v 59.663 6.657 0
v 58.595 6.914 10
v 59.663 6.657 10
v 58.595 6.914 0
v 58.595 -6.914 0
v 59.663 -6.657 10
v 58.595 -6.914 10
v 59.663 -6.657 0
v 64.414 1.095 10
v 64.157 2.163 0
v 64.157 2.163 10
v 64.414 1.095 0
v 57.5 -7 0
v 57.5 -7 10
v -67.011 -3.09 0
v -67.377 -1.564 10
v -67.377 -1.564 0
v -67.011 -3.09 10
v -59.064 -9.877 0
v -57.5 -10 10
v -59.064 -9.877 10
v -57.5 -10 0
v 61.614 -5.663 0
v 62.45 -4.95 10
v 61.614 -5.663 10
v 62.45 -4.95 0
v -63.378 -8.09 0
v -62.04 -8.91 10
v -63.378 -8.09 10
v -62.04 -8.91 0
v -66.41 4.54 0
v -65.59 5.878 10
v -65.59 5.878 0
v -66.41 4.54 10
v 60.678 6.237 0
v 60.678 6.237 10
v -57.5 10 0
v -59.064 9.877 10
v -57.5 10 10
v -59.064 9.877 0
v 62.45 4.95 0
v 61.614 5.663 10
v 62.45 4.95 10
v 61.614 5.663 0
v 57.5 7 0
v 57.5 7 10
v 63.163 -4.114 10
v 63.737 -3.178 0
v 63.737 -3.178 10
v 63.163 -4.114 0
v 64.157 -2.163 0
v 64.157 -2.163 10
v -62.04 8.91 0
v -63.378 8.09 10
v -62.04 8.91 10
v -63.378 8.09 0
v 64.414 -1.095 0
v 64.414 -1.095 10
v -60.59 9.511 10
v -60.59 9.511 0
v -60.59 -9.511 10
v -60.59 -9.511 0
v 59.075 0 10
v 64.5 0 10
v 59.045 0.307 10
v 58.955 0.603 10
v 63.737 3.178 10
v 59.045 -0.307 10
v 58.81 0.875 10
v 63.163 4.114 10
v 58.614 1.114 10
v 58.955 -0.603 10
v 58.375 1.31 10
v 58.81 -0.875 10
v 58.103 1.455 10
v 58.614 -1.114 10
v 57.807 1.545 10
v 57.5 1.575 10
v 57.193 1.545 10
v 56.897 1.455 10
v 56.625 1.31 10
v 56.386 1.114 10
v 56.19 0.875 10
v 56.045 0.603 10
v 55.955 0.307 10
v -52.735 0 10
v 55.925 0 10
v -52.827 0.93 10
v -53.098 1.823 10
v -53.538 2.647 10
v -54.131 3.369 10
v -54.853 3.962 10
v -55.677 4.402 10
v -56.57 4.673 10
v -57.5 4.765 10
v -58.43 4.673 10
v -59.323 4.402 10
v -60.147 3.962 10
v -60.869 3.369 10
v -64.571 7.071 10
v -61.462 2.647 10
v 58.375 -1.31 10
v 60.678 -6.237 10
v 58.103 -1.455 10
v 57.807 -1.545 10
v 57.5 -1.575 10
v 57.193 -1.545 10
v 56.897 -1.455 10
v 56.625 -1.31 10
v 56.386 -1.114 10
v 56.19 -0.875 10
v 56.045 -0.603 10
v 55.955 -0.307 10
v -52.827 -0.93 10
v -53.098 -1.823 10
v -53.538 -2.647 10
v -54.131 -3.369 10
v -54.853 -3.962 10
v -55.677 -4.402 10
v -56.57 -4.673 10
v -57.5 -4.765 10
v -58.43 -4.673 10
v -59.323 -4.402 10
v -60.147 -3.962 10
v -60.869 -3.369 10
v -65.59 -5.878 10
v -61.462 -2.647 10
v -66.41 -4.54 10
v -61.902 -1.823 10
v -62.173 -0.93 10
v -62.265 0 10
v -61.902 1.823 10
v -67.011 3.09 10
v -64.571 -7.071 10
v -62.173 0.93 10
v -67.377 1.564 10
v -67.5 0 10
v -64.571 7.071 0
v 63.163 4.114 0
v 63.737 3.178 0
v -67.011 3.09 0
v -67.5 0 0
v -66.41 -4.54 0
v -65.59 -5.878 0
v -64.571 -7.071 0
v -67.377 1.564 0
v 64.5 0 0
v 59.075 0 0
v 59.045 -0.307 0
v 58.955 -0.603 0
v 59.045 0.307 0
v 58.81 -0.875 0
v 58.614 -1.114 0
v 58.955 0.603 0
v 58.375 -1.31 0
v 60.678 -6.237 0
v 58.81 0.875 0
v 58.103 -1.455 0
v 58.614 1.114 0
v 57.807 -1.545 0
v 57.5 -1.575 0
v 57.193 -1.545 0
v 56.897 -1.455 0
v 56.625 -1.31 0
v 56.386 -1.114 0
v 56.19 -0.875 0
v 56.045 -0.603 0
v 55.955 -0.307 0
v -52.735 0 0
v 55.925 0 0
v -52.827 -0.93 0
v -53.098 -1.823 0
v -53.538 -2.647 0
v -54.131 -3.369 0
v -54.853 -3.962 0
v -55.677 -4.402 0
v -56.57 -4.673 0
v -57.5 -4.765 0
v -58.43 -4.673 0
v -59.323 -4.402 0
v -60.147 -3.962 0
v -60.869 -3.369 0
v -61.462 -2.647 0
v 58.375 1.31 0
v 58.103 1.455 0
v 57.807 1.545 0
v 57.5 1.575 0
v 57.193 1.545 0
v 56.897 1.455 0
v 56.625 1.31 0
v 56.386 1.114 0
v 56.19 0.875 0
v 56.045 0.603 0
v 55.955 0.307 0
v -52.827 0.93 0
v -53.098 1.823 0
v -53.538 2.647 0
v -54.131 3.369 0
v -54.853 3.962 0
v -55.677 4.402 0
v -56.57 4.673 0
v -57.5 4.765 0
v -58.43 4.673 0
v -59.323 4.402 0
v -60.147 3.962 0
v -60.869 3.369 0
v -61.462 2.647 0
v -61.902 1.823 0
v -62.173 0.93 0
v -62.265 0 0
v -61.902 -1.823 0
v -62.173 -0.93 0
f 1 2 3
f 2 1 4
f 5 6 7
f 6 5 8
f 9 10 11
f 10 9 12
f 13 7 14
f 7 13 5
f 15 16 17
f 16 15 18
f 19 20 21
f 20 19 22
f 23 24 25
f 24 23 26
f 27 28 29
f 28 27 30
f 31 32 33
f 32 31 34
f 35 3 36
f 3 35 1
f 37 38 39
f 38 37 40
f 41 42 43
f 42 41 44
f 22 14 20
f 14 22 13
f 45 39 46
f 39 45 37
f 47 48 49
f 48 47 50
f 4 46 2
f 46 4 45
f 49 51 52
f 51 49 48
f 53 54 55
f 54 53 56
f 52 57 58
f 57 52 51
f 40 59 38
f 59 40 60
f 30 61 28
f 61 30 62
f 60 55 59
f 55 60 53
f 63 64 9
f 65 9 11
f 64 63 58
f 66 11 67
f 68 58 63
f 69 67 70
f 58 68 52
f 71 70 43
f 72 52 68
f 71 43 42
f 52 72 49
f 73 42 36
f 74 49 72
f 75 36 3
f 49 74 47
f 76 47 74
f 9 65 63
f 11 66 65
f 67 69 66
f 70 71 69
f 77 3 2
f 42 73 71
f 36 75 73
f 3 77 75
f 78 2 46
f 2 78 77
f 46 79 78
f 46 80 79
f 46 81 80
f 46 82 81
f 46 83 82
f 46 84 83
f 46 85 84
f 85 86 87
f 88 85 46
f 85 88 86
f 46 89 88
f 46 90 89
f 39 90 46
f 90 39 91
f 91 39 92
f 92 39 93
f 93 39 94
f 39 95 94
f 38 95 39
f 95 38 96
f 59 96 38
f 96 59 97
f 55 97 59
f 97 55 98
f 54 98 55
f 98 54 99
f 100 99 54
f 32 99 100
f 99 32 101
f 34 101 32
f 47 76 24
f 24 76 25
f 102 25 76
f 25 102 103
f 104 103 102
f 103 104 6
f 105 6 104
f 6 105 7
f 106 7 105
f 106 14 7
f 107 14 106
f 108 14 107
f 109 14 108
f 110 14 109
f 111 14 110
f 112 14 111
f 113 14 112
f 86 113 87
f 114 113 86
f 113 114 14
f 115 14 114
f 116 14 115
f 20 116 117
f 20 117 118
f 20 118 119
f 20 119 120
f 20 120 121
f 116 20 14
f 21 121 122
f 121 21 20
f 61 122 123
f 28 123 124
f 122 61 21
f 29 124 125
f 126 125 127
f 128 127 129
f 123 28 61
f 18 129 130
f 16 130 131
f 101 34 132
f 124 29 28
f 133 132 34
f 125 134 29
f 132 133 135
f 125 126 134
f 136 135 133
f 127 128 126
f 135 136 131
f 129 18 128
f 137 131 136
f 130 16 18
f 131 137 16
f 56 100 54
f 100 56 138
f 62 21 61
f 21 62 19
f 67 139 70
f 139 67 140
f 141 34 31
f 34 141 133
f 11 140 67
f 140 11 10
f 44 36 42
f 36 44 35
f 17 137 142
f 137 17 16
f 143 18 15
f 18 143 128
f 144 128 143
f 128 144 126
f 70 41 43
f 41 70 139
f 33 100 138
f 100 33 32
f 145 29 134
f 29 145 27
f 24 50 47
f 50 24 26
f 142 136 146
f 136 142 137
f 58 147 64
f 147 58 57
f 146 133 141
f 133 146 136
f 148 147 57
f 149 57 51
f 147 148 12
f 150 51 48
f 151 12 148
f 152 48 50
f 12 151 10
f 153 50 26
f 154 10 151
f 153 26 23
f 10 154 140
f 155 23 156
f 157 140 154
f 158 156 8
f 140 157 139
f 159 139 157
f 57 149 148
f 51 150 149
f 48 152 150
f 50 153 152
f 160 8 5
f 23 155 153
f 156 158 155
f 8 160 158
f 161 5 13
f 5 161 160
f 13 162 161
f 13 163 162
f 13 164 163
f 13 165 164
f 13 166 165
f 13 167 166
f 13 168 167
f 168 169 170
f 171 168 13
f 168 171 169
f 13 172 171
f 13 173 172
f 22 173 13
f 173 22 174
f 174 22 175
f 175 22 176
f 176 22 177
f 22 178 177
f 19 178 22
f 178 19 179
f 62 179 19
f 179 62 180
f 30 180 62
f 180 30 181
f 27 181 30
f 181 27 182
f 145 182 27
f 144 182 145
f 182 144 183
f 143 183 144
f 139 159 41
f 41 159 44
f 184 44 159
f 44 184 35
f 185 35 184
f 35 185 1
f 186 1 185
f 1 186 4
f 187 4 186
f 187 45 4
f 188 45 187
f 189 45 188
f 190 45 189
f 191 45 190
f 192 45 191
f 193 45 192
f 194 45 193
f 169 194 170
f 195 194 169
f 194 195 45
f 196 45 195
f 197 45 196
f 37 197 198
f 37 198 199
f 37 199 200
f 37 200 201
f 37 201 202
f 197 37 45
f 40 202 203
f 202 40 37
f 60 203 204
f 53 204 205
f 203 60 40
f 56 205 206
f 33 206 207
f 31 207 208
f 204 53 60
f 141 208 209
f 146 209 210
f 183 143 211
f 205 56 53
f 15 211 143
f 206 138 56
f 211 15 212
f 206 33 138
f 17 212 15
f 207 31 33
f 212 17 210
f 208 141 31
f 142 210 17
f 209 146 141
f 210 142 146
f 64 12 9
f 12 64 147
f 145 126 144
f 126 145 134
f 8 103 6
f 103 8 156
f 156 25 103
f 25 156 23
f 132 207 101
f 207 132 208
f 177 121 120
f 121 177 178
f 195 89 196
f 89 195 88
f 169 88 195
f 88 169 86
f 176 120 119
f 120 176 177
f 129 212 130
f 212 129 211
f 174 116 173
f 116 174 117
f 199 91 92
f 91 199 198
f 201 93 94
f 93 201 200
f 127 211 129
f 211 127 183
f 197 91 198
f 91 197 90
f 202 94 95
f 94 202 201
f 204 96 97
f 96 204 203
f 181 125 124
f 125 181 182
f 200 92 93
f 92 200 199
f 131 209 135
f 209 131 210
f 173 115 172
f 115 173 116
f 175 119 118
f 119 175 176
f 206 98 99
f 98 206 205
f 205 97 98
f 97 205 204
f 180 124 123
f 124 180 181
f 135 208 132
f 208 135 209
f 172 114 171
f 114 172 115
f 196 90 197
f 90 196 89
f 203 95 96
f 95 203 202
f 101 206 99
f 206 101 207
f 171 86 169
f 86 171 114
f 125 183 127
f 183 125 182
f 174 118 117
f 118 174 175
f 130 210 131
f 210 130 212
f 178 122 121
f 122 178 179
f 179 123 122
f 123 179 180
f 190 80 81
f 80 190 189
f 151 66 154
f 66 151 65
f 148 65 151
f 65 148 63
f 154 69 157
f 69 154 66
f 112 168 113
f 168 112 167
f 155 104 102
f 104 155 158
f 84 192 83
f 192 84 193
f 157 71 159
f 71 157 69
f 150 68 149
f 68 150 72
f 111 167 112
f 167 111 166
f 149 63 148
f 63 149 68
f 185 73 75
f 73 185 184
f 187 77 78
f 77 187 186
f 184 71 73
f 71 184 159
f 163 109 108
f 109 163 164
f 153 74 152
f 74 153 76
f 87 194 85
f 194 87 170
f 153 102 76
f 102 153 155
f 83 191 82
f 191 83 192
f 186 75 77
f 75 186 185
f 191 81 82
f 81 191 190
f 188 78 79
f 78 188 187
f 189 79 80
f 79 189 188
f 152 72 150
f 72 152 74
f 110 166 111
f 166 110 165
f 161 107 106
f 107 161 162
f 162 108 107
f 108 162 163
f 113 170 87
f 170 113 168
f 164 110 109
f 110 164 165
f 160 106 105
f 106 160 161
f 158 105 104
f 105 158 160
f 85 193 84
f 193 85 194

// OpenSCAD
$fn = 32;

// ----------------------------------------------------------------------
// Lever: 115 mm between the bosses, 10 mm thick, smooth outline
// ----------------------------------------------------------------------

// --- parameters (mm) ---
lever_l = 115;            // distance between the boss centres
boss_a = 20;              // first boss diameter
boss_b = 14;              // second boss diameter
bore_a = 9.53;            // first bore
bore_b = 3.15;            // second bore
lever_t = 10;             // lever thickness

lever_profile = [[-67.5, 0], [-67.377, -1.564], [-67.011, -3.09], [-66.41, -4.54], [-65.59, -5.878], [-64.571, -7.071], [-63.378, -8.09], [-62.04, -8.91], [-60.59, -9.511], [-59.064, -9.877], [-57.5, -10], [57.5, -7], [58.595, -6.914], [59.663, -6.657], [60.678, -6.237], [61.614, -5.663], [62.45, -4.95], [63.163, -4.114], [63.737, -3.178], [64.157, -2.163], [64.414, -1.095], [64.5, 0], [64.414, 1.095], [64.157, 2.163], [63.737, 3.178], [63.163, 4.114], [62.45, 4.95], [61.614, 5.663], [60.678, 6.237], [59.663, 6.657], [58.595, 6.914], [57.5, 7], [-57.5, 10], [-59.064, 9.877], [-60.59, 9.511], [-62.04, 8.91], [-63.378, 8.09], [-64.571, 7.071], [-65.59, 5.878], [-66.41, 4.54], [-67.011, 3.09], [-67.377, 1.564]];

difference() {
  linear_extrude(height = lever_t) polygon(lever_profile);
  translate([-57.5, 0, -2.5]) cylinder(h = lever_t + 5, d = bore_a);
  translate([57.5, 0, -2.5]) cylinder(h = lever_t + 5, d = bore_b);
}
